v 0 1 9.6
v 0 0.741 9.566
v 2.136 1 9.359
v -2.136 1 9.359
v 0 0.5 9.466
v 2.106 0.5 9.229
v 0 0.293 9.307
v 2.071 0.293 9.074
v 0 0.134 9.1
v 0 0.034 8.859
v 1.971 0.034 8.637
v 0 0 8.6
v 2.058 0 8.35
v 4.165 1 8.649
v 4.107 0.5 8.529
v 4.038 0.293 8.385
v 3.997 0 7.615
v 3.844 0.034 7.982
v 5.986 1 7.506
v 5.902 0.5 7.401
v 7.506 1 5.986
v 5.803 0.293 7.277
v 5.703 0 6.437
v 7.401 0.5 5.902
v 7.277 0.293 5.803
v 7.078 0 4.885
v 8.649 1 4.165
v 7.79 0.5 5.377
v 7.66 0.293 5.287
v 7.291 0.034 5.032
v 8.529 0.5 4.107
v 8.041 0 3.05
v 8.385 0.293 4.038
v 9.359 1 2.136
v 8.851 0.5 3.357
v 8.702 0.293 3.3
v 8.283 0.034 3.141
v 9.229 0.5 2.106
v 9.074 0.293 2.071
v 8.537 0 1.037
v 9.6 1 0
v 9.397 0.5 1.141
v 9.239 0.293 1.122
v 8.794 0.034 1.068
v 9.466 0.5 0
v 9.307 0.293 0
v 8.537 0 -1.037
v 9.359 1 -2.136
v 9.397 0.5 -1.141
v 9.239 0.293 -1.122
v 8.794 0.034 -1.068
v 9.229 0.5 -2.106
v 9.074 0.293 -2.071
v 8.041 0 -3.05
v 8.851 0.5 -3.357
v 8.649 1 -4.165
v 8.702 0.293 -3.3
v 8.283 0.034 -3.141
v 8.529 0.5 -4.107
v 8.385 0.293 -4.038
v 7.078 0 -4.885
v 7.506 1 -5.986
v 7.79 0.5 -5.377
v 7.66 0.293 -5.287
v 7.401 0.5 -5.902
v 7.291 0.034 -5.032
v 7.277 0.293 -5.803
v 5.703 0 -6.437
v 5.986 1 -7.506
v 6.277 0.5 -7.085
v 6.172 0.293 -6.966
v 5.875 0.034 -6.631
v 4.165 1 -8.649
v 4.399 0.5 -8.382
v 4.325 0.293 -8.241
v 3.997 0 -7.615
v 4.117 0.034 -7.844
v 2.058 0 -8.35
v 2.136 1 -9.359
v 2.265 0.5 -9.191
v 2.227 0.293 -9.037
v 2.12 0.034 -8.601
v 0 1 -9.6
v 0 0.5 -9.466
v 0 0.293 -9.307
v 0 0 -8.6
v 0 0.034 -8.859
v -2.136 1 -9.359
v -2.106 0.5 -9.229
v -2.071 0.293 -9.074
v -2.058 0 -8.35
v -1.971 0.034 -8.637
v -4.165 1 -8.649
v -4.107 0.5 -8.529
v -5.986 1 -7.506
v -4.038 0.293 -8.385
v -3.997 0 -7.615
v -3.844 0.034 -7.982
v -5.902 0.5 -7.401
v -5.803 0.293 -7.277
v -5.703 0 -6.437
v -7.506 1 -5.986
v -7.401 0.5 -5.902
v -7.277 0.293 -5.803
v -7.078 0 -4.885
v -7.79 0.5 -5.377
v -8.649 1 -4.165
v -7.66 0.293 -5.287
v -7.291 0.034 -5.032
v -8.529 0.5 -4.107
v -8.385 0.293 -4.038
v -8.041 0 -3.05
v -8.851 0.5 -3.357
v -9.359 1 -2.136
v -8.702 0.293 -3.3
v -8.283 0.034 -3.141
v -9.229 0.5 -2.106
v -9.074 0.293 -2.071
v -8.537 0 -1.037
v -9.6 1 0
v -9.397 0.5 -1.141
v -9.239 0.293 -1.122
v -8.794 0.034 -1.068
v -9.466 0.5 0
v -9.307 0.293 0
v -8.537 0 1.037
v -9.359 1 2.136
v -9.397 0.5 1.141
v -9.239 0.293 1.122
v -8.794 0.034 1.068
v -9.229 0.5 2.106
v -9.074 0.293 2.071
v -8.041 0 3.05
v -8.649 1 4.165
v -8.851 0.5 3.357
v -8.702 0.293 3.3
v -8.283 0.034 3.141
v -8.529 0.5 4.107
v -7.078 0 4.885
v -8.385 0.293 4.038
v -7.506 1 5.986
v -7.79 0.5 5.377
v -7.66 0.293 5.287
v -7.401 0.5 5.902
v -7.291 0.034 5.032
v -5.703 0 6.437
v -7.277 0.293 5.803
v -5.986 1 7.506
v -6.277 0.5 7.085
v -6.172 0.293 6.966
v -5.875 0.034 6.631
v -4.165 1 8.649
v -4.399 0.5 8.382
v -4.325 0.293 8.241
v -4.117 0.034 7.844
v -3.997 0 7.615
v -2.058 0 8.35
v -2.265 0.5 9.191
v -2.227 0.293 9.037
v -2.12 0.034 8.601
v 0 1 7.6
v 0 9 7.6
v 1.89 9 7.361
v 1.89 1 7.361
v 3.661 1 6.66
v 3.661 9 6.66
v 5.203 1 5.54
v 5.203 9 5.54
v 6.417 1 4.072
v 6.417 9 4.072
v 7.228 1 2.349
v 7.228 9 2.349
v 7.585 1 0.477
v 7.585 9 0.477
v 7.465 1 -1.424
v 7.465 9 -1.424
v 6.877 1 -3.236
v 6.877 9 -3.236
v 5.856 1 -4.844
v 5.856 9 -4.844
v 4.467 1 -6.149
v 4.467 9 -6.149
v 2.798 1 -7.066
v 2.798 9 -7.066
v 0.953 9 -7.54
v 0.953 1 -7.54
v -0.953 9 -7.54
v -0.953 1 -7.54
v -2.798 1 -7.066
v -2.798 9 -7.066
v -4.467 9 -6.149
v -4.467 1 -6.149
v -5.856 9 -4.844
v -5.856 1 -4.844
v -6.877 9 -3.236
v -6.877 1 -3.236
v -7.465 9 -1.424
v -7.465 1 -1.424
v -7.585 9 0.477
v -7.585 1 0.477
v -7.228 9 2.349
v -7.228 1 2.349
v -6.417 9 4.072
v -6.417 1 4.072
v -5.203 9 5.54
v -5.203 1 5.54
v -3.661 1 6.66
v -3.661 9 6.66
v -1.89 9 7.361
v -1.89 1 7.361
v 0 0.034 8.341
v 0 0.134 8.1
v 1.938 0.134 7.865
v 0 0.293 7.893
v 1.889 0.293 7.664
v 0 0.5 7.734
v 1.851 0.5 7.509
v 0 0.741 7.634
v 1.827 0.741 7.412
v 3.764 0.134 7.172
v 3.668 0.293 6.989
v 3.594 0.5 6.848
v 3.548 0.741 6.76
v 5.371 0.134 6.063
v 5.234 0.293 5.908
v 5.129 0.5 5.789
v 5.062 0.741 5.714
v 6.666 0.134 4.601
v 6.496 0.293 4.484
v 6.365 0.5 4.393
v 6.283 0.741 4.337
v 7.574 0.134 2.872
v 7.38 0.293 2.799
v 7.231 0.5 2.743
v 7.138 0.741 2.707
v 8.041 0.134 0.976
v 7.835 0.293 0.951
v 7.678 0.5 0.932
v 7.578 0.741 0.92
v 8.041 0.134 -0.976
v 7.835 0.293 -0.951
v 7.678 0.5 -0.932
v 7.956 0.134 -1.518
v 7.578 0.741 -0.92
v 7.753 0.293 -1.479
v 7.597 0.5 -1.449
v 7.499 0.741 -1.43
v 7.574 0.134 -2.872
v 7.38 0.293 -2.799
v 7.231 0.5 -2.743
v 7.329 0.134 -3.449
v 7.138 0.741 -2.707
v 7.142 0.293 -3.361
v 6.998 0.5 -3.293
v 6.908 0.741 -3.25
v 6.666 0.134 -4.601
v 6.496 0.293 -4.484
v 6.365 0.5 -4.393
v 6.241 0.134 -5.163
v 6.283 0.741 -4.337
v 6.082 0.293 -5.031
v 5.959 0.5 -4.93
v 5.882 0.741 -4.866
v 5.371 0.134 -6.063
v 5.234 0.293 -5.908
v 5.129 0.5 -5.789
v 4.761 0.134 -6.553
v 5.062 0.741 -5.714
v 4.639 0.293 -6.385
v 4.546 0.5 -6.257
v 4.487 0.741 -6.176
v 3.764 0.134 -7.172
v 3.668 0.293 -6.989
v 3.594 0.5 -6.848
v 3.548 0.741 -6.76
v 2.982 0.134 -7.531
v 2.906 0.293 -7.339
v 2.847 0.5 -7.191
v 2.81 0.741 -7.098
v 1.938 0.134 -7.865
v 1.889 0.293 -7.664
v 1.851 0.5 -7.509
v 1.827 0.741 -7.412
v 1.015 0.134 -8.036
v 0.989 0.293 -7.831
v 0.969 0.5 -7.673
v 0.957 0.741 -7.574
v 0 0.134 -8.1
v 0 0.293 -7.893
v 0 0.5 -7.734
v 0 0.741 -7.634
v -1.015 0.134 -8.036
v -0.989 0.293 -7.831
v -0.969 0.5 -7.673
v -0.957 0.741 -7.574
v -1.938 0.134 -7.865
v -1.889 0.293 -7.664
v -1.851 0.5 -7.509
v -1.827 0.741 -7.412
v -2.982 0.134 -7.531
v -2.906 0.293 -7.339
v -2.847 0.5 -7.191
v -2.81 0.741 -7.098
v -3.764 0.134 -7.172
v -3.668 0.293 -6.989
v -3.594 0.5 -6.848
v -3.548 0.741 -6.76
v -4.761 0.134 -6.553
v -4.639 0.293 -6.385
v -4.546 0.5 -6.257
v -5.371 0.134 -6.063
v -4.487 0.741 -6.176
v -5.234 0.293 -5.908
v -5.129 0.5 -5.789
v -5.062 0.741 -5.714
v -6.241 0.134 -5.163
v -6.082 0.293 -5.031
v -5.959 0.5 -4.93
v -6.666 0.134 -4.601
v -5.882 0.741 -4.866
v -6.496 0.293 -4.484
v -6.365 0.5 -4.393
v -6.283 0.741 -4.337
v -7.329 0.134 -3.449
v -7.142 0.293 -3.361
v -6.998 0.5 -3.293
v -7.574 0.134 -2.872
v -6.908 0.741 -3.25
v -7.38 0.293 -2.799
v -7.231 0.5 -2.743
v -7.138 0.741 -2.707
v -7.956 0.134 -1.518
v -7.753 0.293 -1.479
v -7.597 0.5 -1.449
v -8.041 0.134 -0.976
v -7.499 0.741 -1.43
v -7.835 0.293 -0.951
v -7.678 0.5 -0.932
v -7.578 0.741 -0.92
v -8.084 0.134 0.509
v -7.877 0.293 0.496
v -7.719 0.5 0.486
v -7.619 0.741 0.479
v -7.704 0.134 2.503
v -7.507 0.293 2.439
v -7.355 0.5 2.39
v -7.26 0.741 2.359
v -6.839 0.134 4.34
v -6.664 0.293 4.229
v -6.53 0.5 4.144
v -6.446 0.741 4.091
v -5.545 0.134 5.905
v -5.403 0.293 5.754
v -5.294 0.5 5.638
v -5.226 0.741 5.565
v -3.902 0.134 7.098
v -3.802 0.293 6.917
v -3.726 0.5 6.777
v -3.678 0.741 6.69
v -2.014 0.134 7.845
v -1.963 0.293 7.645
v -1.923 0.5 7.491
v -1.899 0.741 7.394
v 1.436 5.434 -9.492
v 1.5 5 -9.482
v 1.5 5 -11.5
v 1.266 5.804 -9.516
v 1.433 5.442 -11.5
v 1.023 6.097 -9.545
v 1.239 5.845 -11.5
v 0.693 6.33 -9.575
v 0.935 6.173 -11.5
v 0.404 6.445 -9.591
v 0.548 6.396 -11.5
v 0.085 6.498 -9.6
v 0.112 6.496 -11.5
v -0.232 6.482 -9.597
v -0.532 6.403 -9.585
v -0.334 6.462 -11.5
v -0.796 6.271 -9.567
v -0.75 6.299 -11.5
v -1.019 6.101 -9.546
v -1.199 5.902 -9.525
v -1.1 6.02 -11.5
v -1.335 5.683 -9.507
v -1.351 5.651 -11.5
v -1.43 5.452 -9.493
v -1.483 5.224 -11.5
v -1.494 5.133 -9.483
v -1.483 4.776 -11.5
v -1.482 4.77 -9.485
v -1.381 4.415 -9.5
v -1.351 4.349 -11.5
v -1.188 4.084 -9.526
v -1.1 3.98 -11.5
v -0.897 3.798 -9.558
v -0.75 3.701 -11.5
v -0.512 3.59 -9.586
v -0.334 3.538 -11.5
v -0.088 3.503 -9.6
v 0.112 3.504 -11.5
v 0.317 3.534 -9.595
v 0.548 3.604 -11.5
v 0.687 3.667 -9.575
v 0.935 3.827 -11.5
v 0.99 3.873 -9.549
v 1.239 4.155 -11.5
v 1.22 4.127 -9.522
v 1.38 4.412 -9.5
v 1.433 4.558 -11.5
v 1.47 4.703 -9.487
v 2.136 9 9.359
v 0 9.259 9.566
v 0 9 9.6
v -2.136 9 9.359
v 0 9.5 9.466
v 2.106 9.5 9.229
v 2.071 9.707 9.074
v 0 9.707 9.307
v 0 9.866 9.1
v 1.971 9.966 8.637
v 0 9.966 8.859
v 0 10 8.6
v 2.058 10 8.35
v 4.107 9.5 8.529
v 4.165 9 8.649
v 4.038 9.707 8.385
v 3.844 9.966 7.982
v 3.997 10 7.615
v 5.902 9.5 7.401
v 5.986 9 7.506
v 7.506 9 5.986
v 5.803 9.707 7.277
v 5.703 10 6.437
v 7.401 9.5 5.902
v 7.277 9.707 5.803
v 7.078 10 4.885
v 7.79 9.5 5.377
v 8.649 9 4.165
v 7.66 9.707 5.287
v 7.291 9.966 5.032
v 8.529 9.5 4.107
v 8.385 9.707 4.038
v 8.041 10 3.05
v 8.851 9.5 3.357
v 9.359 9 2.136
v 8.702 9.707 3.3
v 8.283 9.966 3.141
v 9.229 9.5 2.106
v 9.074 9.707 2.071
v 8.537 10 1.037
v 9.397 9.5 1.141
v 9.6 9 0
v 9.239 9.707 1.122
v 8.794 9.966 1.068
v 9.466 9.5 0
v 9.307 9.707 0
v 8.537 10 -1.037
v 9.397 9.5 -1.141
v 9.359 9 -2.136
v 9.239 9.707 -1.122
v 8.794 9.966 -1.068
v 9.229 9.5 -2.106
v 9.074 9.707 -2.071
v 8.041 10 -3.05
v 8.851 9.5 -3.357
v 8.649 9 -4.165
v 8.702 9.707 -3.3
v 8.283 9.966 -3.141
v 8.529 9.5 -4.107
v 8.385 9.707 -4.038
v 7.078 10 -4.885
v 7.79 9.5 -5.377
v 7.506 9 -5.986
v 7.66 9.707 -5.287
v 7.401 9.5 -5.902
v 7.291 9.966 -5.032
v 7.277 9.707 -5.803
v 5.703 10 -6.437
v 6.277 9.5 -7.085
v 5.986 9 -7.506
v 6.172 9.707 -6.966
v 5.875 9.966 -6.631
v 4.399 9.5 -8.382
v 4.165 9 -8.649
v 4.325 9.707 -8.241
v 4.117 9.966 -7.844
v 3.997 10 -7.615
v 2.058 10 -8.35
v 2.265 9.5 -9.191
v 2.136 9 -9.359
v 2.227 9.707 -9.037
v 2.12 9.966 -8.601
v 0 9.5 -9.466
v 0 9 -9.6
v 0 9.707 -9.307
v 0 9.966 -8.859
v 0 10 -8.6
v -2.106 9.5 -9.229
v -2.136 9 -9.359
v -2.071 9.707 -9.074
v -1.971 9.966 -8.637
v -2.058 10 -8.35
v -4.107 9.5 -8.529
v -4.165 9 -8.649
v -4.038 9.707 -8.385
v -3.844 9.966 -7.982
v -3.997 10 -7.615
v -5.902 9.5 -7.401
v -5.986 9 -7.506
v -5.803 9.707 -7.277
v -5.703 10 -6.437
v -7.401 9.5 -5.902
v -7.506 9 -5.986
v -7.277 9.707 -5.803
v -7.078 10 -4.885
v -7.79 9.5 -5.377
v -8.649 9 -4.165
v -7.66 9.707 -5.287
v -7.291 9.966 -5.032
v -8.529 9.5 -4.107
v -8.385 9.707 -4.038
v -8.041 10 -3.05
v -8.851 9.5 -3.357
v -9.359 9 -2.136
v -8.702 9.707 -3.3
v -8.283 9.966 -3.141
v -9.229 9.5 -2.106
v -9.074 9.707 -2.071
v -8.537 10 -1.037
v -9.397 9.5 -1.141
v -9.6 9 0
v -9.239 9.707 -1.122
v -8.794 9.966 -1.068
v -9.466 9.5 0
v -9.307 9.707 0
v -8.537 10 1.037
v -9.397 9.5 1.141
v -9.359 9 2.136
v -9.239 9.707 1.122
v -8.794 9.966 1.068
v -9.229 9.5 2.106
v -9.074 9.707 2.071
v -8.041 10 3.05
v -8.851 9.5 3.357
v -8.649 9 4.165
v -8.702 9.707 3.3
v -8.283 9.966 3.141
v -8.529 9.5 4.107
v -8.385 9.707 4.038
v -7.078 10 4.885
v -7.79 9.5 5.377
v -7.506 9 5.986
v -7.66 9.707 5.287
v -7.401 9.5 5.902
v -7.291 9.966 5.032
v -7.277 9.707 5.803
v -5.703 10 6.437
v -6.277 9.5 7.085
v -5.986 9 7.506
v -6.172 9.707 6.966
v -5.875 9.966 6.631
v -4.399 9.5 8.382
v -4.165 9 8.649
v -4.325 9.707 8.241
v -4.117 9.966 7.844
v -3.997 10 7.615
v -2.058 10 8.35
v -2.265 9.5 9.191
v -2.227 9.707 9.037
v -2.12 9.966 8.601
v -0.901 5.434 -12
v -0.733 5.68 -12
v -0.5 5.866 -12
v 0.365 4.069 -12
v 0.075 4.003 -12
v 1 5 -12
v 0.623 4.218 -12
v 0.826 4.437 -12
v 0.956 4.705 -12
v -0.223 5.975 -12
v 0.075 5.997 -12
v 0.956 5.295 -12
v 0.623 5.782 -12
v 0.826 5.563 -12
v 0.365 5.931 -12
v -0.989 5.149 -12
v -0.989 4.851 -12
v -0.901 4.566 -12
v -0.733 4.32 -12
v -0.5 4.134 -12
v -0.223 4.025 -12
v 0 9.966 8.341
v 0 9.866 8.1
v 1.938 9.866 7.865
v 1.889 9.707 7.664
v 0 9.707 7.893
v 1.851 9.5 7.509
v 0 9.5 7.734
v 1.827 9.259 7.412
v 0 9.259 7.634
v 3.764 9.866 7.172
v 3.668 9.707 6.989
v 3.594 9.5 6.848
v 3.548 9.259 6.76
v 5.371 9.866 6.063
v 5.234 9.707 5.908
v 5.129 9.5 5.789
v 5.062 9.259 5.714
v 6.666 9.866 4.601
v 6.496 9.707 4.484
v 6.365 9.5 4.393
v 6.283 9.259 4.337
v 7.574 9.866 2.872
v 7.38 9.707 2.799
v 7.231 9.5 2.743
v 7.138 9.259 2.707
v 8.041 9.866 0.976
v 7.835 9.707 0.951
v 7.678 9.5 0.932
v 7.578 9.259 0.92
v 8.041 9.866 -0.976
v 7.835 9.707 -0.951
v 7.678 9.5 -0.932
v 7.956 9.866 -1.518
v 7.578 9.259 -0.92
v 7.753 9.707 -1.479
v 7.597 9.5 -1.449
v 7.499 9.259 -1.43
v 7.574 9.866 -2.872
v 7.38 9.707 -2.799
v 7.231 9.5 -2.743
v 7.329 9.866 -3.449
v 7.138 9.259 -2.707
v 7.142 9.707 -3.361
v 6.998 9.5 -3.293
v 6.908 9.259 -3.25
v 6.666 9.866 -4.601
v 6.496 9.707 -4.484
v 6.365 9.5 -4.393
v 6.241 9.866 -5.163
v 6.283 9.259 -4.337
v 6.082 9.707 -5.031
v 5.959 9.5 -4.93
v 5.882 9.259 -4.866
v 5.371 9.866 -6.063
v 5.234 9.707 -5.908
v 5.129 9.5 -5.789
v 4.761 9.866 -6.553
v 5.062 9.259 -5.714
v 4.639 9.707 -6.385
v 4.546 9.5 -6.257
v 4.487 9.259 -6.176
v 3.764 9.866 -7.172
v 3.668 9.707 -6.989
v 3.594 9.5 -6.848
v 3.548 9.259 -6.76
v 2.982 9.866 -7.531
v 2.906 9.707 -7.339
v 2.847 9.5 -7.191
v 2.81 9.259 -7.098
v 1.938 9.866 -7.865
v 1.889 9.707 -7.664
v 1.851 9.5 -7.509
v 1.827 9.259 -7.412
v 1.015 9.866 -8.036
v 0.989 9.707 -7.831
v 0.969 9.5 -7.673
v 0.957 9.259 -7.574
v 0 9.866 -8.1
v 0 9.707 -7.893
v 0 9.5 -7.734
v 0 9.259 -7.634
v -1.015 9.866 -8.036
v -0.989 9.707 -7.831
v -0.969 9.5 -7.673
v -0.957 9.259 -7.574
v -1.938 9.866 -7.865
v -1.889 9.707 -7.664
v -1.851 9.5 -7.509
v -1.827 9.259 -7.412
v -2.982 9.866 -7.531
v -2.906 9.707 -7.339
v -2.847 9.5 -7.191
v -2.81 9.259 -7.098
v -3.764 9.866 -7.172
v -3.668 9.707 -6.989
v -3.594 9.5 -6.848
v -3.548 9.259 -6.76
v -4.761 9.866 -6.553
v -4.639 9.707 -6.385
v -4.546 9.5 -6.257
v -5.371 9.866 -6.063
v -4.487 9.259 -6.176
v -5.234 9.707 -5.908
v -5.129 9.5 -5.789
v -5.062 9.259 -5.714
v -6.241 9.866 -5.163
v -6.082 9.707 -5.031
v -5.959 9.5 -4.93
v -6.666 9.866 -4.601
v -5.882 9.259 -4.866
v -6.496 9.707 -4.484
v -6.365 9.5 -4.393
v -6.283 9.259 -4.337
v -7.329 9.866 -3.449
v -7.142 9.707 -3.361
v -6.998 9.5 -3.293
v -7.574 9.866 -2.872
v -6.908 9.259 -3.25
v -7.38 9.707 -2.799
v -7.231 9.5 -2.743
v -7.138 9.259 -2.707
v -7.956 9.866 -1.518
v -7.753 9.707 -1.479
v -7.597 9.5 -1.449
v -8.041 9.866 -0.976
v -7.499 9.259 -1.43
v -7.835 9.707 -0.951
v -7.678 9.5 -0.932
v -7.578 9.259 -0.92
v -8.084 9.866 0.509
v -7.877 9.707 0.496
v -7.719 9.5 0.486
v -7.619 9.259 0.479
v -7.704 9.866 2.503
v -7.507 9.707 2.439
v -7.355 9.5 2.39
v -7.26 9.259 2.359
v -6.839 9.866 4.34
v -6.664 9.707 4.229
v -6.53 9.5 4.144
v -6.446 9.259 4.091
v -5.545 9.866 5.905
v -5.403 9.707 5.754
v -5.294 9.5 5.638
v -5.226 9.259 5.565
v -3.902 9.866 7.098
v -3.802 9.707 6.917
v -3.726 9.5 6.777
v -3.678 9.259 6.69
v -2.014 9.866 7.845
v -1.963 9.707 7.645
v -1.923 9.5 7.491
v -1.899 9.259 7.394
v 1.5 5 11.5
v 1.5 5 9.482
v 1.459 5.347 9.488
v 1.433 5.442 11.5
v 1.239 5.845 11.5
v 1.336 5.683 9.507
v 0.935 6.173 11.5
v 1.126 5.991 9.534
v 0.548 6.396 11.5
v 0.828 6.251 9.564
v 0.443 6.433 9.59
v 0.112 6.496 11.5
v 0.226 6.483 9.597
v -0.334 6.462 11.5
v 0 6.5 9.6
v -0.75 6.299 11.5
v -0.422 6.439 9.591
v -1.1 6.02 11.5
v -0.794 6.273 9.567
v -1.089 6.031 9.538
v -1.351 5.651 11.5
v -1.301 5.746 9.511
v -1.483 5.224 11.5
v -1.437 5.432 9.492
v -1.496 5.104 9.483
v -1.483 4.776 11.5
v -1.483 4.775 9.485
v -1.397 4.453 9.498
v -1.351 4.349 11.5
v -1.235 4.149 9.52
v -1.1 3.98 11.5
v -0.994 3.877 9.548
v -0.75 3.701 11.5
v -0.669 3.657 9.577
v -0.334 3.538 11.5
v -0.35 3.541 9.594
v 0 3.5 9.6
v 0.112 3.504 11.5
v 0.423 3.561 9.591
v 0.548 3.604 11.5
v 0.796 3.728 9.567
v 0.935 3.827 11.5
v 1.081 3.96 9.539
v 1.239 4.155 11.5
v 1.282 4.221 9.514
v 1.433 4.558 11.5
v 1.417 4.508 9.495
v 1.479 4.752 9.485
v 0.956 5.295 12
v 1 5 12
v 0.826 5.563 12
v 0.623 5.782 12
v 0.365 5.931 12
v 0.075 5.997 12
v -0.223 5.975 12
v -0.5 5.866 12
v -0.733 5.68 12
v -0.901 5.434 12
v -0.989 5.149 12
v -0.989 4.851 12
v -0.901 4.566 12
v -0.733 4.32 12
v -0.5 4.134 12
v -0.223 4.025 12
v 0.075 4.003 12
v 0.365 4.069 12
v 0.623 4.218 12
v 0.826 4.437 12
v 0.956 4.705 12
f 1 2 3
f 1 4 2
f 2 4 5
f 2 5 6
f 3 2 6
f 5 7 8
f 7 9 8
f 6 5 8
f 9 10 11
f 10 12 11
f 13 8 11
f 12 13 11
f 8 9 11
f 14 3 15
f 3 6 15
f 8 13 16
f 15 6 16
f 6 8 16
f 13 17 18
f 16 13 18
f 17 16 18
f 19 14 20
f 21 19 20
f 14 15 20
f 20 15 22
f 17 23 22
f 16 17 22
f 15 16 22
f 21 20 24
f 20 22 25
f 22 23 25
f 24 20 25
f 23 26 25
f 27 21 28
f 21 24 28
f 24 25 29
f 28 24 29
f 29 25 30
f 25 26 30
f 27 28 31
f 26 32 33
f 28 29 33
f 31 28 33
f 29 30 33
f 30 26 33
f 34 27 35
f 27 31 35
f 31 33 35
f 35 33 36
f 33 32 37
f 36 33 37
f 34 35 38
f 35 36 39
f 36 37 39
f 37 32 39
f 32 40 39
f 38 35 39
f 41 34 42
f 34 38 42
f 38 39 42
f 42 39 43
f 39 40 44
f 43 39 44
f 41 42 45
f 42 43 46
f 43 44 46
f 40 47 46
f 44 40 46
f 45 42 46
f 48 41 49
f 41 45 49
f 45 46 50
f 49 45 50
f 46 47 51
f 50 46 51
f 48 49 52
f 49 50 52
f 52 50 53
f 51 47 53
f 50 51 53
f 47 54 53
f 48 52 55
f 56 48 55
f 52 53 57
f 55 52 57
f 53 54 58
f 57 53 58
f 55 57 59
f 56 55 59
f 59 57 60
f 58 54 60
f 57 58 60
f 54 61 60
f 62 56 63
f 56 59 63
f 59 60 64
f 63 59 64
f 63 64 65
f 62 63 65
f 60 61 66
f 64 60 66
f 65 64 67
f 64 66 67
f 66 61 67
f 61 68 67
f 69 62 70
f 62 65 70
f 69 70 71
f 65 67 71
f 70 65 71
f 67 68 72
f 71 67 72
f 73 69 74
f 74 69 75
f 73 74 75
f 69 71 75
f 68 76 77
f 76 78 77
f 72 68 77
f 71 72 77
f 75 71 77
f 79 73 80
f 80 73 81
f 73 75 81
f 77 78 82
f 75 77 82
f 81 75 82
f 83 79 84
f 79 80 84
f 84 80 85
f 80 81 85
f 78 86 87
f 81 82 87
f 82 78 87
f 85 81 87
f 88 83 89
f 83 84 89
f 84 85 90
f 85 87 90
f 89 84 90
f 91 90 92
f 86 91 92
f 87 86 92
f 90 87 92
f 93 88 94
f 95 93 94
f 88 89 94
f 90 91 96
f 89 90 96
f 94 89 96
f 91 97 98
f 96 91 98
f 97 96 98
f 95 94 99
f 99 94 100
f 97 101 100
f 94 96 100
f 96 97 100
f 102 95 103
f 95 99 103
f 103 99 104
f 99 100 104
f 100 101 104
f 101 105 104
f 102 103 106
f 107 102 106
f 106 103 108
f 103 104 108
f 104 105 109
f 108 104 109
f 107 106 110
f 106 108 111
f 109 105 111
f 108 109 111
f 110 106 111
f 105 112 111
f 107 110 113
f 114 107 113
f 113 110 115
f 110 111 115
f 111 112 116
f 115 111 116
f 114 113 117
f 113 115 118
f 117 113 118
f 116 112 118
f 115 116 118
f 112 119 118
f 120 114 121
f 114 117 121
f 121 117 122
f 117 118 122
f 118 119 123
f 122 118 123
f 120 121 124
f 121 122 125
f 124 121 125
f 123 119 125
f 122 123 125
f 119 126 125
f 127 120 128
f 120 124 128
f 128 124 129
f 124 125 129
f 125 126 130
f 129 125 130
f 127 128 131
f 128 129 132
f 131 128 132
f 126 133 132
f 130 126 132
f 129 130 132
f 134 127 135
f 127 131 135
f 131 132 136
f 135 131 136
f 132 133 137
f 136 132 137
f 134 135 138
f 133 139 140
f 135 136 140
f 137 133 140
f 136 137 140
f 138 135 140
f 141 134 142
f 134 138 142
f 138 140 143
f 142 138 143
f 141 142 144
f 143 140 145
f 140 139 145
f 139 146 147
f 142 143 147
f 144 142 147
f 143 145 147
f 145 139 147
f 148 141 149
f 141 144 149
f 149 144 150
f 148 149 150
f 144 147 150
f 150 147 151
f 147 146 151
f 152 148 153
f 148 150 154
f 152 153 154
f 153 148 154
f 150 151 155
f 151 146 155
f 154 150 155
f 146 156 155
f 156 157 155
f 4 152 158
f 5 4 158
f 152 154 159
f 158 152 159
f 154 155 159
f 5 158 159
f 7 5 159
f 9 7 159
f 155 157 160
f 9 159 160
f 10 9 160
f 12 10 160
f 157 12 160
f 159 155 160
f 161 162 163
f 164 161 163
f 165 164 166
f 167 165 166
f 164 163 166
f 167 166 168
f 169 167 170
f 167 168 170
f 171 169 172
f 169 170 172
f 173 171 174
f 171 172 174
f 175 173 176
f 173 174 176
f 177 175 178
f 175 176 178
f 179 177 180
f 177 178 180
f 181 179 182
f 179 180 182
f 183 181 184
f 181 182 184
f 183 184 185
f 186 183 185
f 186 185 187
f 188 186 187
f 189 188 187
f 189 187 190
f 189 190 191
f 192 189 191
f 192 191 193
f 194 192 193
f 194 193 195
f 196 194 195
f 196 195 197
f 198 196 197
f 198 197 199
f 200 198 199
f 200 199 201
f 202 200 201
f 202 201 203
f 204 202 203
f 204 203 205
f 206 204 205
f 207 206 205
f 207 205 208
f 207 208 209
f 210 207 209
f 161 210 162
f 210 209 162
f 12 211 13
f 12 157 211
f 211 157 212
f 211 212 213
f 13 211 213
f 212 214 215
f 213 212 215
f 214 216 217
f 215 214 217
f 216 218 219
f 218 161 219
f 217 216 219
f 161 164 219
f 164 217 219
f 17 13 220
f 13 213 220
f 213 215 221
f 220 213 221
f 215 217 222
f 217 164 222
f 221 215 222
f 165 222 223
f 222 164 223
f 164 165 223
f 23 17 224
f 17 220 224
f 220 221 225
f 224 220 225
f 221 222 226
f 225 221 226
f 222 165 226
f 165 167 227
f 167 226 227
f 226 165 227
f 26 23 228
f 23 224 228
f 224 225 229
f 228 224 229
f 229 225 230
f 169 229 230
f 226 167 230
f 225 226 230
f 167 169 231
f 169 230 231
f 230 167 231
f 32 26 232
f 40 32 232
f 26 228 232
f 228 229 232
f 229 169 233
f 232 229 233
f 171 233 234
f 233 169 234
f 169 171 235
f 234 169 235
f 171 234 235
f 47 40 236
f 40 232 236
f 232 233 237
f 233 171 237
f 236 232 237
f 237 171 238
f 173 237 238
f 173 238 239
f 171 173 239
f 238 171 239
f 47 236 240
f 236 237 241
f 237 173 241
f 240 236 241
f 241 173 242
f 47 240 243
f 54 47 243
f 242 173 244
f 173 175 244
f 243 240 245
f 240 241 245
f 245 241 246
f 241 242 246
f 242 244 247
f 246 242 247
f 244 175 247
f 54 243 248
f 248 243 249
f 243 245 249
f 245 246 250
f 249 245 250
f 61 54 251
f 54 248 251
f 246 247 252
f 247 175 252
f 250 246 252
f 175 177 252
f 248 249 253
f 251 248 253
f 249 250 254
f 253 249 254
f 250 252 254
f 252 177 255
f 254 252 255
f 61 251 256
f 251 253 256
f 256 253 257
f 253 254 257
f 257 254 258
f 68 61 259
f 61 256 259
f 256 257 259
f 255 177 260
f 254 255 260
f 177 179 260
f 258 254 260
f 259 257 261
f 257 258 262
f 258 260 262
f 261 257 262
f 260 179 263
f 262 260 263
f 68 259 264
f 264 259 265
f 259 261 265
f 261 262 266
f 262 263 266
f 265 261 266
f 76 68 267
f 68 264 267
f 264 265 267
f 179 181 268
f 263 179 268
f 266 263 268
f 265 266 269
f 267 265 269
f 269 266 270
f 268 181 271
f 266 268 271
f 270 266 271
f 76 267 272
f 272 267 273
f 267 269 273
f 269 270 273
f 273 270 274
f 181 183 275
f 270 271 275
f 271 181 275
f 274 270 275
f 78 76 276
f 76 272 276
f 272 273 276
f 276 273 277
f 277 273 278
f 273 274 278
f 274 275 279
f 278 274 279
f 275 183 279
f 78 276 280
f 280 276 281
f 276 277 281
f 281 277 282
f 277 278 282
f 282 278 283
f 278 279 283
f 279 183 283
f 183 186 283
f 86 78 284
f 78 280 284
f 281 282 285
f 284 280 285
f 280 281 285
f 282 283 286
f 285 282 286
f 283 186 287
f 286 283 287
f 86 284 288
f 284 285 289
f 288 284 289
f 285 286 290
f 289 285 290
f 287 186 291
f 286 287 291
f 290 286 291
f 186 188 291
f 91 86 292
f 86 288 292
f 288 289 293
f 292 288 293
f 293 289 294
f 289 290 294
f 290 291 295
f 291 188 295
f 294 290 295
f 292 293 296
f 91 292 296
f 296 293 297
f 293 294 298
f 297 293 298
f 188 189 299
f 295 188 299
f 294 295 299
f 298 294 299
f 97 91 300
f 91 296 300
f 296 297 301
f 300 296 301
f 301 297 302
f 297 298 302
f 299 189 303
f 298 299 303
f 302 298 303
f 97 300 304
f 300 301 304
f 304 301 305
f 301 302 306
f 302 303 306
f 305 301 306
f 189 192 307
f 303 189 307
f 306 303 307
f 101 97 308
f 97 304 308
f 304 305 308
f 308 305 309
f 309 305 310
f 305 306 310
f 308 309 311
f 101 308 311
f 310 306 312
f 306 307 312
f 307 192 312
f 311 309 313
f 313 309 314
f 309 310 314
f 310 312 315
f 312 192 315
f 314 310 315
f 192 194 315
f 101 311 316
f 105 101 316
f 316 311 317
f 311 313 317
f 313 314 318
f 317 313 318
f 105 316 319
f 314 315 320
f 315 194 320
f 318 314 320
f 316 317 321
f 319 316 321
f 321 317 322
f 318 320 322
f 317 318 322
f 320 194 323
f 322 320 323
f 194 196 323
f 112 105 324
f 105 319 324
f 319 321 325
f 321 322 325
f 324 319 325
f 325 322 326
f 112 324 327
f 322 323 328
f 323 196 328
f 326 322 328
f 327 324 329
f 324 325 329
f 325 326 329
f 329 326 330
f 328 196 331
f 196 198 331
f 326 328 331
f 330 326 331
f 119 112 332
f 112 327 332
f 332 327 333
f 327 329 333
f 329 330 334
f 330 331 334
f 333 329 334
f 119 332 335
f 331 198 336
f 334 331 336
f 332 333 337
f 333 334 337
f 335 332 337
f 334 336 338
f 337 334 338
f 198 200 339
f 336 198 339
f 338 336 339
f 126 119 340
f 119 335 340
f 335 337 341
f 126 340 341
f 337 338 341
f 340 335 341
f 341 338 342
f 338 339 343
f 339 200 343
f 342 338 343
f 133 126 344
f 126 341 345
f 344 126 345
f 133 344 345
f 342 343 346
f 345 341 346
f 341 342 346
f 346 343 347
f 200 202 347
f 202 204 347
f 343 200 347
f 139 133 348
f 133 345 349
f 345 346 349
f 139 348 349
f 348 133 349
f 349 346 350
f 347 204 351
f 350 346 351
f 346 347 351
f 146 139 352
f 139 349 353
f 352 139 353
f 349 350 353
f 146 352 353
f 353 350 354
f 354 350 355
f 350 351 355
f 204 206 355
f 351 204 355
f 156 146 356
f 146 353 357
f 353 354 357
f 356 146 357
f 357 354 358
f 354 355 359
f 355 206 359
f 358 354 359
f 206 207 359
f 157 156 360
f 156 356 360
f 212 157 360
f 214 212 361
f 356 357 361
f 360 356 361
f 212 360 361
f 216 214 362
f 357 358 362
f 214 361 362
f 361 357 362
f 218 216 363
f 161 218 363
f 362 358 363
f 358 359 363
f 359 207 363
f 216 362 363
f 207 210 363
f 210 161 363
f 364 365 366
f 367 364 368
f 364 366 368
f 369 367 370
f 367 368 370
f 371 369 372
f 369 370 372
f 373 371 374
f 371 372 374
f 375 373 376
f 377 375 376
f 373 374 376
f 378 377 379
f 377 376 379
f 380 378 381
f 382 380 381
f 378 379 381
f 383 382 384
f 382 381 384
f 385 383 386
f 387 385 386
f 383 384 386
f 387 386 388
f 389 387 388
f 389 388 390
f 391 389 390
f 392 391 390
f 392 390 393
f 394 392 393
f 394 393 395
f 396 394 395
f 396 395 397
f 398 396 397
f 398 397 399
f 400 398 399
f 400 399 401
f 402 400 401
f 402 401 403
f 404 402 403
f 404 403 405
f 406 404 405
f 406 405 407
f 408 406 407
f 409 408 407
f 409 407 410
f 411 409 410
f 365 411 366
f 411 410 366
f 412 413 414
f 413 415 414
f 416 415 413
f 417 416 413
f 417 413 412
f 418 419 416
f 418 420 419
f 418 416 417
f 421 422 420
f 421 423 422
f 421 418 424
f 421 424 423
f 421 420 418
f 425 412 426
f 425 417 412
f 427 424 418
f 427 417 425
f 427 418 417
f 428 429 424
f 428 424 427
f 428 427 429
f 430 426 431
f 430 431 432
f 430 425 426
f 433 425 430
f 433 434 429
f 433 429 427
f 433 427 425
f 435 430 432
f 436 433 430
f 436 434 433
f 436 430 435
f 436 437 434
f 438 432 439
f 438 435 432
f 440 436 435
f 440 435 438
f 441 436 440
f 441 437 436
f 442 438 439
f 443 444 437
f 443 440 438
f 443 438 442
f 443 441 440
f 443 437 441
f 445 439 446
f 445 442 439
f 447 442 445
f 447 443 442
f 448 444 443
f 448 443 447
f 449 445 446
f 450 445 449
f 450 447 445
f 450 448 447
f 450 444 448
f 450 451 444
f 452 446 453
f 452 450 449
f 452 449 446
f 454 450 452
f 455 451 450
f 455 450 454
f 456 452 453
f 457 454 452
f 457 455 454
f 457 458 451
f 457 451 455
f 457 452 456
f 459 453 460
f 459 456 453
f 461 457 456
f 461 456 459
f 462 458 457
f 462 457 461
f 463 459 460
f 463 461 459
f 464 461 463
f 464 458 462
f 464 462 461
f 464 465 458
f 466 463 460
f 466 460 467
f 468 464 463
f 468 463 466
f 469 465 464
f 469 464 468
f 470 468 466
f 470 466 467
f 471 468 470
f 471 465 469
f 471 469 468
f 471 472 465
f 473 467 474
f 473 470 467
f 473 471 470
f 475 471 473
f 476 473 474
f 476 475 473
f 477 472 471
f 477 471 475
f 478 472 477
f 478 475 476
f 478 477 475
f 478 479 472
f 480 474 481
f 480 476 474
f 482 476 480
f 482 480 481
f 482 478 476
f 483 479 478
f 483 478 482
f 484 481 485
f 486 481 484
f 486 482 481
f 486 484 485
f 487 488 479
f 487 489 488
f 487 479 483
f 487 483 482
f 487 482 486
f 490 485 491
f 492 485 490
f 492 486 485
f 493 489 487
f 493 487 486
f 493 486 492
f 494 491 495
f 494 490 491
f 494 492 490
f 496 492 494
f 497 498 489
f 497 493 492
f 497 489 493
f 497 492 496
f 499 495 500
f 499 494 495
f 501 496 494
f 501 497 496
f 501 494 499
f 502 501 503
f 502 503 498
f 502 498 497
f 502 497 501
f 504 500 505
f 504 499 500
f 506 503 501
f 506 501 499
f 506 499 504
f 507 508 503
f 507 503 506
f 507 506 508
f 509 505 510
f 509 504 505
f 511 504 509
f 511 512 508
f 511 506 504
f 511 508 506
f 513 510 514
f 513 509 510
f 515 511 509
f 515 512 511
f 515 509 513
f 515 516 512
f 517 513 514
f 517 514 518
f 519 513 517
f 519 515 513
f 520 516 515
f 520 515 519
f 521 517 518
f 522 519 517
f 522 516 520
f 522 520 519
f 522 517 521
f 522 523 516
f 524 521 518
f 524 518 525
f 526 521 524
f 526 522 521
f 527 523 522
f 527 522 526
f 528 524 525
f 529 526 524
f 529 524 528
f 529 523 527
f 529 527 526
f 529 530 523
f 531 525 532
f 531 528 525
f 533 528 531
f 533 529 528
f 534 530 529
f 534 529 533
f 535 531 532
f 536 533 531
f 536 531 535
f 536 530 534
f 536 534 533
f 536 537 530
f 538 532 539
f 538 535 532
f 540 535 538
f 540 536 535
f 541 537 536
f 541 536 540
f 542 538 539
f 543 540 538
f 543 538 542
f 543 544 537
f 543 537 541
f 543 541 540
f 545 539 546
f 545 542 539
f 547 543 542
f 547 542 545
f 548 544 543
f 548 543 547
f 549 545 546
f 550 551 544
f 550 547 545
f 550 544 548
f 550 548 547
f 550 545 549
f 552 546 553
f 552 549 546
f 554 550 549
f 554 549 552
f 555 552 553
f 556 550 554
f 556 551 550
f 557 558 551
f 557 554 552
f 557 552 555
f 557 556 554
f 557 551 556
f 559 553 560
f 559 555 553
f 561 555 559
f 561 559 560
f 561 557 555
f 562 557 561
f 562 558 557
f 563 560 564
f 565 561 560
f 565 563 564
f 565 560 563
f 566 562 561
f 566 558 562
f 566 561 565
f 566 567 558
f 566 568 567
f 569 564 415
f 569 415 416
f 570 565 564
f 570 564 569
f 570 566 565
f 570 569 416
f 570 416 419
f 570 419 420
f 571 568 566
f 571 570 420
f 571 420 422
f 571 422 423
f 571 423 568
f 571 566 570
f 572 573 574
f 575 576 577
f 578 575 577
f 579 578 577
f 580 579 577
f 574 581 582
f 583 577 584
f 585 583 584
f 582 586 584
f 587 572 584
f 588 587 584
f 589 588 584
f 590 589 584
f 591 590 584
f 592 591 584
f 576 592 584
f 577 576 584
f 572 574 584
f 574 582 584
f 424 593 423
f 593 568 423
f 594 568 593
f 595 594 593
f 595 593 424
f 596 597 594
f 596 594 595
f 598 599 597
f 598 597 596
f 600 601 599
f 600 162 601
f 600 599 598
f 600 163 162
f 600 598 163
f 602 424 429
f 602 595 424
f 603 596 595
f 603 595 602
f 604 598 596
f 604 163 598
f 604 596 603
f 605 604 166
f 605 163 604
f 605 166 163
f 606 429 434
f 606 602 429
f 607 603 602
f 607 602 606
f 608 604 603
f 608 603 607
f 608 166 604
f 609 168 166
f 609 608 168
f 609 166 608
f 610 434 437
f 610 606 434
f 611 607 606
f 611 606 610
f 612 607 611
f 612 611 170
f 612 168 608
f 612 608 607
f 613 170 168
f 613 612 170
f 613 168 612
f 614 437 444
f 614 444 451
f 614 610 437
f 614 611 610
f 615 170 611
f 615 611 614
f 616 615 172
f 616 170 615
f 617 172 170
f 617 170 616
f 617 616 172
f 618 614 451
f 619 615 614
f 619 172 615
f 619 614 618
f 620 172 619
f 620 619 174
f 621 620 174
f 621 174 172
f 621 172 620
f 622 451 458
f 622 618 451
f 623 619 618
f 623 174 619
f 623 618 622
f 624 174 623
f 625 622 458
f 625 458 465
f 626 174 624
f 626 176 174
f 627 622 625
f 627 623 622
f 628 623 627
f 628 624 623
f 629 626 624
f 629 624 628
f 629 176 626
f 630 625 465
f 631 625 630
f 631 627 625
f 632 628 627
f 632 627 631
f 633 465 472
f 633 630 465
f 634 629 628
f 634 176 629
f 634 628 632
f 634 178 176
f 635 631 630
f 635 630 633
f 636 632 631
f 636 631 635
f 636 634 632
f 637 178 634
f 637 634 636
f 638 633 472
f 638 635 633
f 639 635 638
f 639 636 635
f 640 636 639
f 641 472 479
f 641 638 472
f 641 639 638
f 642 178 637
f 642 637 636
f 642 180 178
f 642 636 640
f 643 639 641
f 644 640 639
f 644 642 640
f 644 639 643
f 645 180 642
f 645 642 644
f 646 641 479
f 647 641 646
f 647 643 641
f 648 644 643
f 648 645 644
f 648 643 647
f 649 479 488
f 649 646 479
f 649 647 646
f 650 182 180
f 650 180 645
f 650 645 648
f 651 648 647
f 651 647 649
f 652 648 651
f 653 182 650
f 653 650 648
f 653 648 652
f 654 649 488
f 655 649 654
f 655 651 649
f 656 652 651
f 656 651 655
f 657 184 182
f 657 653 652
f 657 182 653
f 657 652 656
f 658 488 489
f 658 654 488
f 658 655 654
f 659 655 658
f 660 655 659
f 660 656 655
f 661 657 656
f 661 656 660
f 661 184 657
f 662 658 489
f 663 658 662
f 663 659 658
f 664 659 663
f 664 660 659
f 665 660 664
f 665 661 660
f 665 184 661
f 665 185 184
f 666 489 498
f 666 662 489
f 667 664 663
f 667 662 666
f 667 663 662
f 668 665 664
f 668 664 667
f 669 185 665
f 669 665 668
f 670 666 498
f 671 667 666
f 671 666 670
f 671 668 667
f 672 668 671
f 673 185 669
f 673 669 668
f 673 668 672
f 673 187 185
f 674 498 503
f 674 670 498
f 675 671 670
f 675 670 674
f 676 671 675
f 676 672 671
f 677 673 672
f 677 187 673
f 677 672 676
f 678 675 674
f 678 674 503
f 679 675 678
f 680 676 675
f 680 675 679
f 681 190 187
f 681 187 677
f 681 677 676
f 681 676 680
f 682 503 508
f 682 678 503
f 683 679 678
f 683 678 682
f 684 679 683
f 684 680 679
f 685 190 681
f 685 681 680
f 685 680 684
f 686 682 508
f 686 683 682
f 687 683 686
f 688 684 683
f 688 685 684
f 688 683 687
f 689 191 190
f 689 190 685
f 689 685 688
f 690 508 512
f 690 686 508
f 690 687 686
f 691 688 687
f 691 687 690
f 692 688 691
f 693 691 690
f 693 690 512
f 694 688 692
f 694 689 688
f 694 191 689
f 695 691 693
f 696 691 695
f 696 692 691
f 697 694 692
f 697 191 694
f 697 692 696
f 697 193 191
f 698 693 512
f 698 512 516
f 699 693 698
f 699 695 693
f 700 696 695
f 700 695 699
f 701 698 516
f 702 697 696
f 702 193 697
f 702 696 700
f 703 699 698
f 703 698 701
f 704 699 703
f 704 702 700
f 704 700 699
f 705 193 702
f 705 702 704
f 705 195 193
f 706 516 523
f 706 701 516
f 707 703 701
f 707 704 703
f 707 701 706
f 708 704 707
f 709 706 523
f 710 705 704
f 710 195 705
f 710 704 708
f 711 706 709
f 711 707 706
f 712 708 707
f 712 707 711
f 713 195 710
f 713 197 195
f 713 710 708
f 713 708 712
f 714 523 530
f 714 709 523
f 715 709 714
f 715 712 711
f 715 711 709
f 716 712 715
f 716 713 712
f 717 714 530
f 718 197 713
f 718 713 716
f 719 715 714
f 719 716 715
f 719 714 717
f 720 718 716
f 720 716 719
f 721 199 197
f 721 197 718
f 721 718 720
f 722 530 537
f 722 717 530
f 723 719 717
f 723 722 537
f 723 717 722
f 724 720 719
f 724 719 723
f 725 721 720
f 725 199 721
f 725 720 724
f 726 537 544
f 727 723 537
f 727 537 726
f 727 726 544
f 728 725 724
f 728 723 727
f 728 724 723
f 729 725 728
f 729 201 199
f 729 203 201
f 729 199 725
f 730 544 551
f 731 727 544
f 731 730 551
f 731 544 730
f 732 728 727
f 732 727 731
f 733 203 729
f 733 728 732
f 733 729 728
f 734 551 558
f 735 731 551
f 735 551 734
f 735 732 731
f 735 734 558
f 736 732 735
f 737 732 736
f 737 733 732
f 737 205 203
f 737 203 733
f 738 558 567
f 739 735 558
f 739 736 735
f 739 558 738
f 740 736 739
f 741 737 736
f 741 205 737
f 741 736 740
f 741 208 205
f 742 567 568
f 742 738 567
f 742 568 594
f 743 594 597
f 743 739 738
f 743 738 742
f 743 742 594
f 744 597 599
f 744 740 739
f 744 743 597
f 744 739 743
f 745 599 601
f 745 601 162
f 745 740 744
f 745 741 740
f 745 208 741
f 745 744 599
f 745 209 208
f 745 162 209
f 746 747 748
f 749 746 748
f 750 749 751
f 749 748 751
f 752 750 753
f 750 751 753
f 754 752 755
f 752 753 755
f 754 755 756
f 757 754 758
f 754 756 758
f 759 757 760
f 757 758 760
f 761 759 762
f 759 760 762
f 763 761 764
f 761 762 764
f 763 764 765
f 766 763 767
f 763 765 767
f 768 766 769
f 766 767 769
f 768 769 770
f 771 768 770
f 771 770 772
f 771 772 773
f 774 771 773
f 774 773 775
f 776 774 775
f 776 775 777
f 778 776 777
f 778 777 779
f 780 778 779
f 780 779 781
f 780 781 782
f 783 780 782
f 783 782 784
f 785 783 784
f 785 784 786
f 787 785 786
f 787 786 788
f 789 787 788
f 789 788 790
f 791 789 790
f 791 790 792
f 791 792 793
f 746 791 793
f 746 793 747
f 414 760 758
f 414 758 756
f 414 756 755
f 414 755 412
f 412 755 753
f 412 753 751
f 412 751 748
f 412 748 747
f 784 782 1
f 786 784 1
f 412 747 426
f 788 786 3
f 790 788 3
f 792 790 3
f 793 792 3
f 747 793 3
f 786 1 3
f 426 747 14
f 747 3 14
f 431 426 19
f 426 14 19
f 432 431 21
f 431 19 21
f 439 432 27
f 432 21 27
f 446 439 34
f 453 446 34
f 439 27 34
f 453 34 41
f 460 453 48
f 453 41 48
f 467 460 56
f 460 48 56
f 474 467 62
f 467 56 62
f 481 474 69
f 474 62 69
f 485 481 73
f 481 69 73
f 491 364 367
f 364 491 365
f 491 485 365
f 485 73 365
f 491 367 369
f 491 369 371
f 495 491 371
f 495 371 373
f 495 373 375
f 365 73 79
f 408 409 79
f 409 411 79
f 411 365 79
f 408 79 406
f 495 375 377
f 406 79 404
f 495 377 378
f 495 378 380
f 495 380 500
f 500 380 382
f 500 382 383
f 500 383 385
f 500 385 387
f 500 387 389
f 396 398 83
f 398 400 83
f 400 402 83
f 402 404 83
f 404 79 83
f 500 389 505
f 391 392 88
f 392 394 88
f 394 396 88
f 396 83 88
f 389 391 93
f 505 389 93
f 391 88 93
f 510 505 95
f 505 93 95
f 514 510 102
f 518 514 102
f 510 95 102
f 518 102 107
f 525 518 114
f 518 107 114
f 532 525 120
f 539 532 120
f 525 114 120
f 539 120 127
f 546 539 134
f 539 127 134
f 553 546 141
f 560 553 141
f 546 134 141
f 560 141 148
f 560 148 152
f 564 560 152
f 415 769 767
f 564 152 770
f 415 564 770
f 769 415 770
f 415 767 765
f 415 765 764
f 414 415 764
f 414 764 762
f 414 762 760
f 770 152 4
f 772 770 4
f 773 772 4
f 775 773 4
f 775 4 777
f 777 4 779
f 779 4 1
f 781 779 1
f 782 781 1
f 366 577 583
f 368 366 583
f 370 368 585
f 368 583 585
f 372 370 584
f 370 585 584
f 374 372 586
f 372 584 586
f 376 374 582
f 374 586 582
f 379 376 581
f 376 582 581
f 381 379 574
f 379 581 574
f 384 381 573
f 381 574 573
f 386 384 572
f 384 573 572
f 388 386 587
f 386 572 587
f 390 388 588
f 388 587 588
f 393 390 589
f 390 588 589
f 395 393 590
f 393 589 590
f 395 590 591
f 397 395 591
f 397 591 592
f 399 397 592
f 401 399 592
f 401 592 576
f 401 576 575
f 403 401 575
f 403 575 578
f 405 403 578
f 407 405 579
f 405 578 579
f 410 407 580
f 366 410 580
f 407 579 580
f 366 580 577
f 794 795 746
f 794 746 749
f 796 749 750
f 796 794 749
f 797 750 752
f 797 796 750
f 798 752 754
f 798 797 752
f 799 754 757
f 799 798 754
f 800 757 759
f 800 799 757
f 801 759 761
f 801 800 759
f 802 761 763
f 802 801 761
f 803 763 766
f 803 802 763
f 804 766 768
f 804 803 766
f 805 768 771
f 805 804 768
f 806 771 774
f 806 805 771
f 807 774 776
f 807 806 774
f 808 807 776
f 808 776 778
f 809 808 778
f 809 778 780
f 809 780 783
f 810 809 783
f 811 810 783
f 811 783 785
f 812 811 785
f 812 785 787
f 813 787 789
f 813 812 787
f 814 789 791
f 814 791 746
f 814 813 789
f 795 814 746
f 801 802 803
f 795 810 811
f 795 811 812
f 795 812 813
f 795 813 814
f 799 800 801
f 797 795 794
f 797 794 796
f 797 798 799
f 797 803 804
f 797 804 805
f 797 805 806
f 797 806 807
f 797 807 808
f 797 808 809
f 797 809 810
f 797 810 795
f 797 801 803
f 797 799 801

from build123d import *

# Parameters (mm, degrees)
SKETCH1_R                = 9.6
BOSS_EXTRUDE1_DEPTH      = 10
BOSS_EXTRUDE2_DEPTH      = 12
BOSS_EXTRUDE2_DEPTH_BACK = 12
SKETCH2_R                = 1.5
SKETCH3_R                = 7.6
CUT_EXTRUDE1_DEPTH       = 12
FILLET1_R                = 1
CHAMFER1_SIZE            = 0.5


with BuildPart() as part:
    # Sketch1 → Boss-Extrude1 (new body)
    with BuildSketch(Plane(origin=(0, 0, 0), x_dir=(1, 0, 0), z_dir=(0, 1, 0))):
        with Locations(Location((0, 0, 0), (0, 0, 270))):
            Circle(SKETCH1_R)
    extrude(amount=BOSS_EXTRUDE1_DEPTH)

    # Sketch2 → Boss-Extrude2 (add, two sides: drawn at the far end of the back side and taken through both)
    with BuildSketch(Plane.XY.offset(-BOSS_EXTRUDE2_DEPTH_BACK)):
        with Locations((0, 5)):
            Circle(SKETCH2_R)
    extrude(amount=BOSS_EXTRUDE2_DEPTH + BOSS_EXTRUDE2_DEPTH_BACK)

    # Sketch3 → Cut-Extrude1 (cut)
    with BuildSketch(Plane(origin=(0, 10, 0), x_dir=(1, 0, 0), z_dir=(0, 1, 0))):
        with Locations(Location((0, 0, 0), (0, 0, 270))):
            Circle(SKETCH3_R)
    extrude(amount=-CUT_EXTRUDE1_DEPTH, mode=Mode.SUBTRACT)

    # Fillet1
    fillet1_edges = [part.edges().sort_by_distance(p)[0] for p in [
        (0, 0, -7.6),
        (0, 10, -7.6),
        (0, 0, -9.6),
        (0, 10, -9.6),
    ]]
    fillet(fillet1_edges, radius=FILLET1_R - 0.0001)  # a hair under: the kernel refuses the full size

    # Chamfer1
    chamfer1_edges = [part.edges().sort_by_distance(p)[0] for p in [
        (-1.5, 5, -12),
        (-1.5, 5, 12),
    ]]
    chamfer(chamfer1_edges, length=CHAMFER1_SIZE)


solid = part.part
